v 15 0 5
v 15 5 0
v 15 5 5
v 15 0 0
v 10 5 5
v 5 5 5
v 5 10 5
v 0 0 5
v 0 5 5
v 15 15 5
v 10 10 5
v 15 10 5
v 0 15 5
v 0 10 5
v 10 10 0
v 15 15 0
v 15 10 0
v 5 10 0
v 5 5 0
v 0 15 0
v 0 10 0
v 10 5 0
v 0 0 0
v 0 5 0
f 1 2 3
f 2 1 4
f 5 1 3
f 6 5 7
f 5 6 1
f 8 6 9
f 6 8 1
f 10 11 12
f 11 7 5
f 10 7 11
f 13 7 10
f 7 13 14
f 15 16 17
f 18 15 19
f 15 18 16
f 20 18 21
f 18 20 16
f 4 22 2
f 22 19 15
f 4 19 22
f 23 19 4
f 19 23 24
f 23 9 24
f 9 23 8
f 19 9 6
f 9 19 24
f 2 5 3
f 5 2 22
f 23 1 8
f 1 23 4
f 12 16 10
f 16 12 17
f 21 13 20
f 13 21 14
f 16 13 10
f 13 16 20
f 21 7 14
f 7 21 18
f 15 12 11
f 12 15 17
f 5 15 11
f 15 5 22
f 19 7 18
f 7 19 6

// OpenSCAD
cube([15, 5, 5]);
translate([0, 10, 0]) cube([15, 5, 5]);
translate([5, 0, 0]) cube([5, 15, 5]);
